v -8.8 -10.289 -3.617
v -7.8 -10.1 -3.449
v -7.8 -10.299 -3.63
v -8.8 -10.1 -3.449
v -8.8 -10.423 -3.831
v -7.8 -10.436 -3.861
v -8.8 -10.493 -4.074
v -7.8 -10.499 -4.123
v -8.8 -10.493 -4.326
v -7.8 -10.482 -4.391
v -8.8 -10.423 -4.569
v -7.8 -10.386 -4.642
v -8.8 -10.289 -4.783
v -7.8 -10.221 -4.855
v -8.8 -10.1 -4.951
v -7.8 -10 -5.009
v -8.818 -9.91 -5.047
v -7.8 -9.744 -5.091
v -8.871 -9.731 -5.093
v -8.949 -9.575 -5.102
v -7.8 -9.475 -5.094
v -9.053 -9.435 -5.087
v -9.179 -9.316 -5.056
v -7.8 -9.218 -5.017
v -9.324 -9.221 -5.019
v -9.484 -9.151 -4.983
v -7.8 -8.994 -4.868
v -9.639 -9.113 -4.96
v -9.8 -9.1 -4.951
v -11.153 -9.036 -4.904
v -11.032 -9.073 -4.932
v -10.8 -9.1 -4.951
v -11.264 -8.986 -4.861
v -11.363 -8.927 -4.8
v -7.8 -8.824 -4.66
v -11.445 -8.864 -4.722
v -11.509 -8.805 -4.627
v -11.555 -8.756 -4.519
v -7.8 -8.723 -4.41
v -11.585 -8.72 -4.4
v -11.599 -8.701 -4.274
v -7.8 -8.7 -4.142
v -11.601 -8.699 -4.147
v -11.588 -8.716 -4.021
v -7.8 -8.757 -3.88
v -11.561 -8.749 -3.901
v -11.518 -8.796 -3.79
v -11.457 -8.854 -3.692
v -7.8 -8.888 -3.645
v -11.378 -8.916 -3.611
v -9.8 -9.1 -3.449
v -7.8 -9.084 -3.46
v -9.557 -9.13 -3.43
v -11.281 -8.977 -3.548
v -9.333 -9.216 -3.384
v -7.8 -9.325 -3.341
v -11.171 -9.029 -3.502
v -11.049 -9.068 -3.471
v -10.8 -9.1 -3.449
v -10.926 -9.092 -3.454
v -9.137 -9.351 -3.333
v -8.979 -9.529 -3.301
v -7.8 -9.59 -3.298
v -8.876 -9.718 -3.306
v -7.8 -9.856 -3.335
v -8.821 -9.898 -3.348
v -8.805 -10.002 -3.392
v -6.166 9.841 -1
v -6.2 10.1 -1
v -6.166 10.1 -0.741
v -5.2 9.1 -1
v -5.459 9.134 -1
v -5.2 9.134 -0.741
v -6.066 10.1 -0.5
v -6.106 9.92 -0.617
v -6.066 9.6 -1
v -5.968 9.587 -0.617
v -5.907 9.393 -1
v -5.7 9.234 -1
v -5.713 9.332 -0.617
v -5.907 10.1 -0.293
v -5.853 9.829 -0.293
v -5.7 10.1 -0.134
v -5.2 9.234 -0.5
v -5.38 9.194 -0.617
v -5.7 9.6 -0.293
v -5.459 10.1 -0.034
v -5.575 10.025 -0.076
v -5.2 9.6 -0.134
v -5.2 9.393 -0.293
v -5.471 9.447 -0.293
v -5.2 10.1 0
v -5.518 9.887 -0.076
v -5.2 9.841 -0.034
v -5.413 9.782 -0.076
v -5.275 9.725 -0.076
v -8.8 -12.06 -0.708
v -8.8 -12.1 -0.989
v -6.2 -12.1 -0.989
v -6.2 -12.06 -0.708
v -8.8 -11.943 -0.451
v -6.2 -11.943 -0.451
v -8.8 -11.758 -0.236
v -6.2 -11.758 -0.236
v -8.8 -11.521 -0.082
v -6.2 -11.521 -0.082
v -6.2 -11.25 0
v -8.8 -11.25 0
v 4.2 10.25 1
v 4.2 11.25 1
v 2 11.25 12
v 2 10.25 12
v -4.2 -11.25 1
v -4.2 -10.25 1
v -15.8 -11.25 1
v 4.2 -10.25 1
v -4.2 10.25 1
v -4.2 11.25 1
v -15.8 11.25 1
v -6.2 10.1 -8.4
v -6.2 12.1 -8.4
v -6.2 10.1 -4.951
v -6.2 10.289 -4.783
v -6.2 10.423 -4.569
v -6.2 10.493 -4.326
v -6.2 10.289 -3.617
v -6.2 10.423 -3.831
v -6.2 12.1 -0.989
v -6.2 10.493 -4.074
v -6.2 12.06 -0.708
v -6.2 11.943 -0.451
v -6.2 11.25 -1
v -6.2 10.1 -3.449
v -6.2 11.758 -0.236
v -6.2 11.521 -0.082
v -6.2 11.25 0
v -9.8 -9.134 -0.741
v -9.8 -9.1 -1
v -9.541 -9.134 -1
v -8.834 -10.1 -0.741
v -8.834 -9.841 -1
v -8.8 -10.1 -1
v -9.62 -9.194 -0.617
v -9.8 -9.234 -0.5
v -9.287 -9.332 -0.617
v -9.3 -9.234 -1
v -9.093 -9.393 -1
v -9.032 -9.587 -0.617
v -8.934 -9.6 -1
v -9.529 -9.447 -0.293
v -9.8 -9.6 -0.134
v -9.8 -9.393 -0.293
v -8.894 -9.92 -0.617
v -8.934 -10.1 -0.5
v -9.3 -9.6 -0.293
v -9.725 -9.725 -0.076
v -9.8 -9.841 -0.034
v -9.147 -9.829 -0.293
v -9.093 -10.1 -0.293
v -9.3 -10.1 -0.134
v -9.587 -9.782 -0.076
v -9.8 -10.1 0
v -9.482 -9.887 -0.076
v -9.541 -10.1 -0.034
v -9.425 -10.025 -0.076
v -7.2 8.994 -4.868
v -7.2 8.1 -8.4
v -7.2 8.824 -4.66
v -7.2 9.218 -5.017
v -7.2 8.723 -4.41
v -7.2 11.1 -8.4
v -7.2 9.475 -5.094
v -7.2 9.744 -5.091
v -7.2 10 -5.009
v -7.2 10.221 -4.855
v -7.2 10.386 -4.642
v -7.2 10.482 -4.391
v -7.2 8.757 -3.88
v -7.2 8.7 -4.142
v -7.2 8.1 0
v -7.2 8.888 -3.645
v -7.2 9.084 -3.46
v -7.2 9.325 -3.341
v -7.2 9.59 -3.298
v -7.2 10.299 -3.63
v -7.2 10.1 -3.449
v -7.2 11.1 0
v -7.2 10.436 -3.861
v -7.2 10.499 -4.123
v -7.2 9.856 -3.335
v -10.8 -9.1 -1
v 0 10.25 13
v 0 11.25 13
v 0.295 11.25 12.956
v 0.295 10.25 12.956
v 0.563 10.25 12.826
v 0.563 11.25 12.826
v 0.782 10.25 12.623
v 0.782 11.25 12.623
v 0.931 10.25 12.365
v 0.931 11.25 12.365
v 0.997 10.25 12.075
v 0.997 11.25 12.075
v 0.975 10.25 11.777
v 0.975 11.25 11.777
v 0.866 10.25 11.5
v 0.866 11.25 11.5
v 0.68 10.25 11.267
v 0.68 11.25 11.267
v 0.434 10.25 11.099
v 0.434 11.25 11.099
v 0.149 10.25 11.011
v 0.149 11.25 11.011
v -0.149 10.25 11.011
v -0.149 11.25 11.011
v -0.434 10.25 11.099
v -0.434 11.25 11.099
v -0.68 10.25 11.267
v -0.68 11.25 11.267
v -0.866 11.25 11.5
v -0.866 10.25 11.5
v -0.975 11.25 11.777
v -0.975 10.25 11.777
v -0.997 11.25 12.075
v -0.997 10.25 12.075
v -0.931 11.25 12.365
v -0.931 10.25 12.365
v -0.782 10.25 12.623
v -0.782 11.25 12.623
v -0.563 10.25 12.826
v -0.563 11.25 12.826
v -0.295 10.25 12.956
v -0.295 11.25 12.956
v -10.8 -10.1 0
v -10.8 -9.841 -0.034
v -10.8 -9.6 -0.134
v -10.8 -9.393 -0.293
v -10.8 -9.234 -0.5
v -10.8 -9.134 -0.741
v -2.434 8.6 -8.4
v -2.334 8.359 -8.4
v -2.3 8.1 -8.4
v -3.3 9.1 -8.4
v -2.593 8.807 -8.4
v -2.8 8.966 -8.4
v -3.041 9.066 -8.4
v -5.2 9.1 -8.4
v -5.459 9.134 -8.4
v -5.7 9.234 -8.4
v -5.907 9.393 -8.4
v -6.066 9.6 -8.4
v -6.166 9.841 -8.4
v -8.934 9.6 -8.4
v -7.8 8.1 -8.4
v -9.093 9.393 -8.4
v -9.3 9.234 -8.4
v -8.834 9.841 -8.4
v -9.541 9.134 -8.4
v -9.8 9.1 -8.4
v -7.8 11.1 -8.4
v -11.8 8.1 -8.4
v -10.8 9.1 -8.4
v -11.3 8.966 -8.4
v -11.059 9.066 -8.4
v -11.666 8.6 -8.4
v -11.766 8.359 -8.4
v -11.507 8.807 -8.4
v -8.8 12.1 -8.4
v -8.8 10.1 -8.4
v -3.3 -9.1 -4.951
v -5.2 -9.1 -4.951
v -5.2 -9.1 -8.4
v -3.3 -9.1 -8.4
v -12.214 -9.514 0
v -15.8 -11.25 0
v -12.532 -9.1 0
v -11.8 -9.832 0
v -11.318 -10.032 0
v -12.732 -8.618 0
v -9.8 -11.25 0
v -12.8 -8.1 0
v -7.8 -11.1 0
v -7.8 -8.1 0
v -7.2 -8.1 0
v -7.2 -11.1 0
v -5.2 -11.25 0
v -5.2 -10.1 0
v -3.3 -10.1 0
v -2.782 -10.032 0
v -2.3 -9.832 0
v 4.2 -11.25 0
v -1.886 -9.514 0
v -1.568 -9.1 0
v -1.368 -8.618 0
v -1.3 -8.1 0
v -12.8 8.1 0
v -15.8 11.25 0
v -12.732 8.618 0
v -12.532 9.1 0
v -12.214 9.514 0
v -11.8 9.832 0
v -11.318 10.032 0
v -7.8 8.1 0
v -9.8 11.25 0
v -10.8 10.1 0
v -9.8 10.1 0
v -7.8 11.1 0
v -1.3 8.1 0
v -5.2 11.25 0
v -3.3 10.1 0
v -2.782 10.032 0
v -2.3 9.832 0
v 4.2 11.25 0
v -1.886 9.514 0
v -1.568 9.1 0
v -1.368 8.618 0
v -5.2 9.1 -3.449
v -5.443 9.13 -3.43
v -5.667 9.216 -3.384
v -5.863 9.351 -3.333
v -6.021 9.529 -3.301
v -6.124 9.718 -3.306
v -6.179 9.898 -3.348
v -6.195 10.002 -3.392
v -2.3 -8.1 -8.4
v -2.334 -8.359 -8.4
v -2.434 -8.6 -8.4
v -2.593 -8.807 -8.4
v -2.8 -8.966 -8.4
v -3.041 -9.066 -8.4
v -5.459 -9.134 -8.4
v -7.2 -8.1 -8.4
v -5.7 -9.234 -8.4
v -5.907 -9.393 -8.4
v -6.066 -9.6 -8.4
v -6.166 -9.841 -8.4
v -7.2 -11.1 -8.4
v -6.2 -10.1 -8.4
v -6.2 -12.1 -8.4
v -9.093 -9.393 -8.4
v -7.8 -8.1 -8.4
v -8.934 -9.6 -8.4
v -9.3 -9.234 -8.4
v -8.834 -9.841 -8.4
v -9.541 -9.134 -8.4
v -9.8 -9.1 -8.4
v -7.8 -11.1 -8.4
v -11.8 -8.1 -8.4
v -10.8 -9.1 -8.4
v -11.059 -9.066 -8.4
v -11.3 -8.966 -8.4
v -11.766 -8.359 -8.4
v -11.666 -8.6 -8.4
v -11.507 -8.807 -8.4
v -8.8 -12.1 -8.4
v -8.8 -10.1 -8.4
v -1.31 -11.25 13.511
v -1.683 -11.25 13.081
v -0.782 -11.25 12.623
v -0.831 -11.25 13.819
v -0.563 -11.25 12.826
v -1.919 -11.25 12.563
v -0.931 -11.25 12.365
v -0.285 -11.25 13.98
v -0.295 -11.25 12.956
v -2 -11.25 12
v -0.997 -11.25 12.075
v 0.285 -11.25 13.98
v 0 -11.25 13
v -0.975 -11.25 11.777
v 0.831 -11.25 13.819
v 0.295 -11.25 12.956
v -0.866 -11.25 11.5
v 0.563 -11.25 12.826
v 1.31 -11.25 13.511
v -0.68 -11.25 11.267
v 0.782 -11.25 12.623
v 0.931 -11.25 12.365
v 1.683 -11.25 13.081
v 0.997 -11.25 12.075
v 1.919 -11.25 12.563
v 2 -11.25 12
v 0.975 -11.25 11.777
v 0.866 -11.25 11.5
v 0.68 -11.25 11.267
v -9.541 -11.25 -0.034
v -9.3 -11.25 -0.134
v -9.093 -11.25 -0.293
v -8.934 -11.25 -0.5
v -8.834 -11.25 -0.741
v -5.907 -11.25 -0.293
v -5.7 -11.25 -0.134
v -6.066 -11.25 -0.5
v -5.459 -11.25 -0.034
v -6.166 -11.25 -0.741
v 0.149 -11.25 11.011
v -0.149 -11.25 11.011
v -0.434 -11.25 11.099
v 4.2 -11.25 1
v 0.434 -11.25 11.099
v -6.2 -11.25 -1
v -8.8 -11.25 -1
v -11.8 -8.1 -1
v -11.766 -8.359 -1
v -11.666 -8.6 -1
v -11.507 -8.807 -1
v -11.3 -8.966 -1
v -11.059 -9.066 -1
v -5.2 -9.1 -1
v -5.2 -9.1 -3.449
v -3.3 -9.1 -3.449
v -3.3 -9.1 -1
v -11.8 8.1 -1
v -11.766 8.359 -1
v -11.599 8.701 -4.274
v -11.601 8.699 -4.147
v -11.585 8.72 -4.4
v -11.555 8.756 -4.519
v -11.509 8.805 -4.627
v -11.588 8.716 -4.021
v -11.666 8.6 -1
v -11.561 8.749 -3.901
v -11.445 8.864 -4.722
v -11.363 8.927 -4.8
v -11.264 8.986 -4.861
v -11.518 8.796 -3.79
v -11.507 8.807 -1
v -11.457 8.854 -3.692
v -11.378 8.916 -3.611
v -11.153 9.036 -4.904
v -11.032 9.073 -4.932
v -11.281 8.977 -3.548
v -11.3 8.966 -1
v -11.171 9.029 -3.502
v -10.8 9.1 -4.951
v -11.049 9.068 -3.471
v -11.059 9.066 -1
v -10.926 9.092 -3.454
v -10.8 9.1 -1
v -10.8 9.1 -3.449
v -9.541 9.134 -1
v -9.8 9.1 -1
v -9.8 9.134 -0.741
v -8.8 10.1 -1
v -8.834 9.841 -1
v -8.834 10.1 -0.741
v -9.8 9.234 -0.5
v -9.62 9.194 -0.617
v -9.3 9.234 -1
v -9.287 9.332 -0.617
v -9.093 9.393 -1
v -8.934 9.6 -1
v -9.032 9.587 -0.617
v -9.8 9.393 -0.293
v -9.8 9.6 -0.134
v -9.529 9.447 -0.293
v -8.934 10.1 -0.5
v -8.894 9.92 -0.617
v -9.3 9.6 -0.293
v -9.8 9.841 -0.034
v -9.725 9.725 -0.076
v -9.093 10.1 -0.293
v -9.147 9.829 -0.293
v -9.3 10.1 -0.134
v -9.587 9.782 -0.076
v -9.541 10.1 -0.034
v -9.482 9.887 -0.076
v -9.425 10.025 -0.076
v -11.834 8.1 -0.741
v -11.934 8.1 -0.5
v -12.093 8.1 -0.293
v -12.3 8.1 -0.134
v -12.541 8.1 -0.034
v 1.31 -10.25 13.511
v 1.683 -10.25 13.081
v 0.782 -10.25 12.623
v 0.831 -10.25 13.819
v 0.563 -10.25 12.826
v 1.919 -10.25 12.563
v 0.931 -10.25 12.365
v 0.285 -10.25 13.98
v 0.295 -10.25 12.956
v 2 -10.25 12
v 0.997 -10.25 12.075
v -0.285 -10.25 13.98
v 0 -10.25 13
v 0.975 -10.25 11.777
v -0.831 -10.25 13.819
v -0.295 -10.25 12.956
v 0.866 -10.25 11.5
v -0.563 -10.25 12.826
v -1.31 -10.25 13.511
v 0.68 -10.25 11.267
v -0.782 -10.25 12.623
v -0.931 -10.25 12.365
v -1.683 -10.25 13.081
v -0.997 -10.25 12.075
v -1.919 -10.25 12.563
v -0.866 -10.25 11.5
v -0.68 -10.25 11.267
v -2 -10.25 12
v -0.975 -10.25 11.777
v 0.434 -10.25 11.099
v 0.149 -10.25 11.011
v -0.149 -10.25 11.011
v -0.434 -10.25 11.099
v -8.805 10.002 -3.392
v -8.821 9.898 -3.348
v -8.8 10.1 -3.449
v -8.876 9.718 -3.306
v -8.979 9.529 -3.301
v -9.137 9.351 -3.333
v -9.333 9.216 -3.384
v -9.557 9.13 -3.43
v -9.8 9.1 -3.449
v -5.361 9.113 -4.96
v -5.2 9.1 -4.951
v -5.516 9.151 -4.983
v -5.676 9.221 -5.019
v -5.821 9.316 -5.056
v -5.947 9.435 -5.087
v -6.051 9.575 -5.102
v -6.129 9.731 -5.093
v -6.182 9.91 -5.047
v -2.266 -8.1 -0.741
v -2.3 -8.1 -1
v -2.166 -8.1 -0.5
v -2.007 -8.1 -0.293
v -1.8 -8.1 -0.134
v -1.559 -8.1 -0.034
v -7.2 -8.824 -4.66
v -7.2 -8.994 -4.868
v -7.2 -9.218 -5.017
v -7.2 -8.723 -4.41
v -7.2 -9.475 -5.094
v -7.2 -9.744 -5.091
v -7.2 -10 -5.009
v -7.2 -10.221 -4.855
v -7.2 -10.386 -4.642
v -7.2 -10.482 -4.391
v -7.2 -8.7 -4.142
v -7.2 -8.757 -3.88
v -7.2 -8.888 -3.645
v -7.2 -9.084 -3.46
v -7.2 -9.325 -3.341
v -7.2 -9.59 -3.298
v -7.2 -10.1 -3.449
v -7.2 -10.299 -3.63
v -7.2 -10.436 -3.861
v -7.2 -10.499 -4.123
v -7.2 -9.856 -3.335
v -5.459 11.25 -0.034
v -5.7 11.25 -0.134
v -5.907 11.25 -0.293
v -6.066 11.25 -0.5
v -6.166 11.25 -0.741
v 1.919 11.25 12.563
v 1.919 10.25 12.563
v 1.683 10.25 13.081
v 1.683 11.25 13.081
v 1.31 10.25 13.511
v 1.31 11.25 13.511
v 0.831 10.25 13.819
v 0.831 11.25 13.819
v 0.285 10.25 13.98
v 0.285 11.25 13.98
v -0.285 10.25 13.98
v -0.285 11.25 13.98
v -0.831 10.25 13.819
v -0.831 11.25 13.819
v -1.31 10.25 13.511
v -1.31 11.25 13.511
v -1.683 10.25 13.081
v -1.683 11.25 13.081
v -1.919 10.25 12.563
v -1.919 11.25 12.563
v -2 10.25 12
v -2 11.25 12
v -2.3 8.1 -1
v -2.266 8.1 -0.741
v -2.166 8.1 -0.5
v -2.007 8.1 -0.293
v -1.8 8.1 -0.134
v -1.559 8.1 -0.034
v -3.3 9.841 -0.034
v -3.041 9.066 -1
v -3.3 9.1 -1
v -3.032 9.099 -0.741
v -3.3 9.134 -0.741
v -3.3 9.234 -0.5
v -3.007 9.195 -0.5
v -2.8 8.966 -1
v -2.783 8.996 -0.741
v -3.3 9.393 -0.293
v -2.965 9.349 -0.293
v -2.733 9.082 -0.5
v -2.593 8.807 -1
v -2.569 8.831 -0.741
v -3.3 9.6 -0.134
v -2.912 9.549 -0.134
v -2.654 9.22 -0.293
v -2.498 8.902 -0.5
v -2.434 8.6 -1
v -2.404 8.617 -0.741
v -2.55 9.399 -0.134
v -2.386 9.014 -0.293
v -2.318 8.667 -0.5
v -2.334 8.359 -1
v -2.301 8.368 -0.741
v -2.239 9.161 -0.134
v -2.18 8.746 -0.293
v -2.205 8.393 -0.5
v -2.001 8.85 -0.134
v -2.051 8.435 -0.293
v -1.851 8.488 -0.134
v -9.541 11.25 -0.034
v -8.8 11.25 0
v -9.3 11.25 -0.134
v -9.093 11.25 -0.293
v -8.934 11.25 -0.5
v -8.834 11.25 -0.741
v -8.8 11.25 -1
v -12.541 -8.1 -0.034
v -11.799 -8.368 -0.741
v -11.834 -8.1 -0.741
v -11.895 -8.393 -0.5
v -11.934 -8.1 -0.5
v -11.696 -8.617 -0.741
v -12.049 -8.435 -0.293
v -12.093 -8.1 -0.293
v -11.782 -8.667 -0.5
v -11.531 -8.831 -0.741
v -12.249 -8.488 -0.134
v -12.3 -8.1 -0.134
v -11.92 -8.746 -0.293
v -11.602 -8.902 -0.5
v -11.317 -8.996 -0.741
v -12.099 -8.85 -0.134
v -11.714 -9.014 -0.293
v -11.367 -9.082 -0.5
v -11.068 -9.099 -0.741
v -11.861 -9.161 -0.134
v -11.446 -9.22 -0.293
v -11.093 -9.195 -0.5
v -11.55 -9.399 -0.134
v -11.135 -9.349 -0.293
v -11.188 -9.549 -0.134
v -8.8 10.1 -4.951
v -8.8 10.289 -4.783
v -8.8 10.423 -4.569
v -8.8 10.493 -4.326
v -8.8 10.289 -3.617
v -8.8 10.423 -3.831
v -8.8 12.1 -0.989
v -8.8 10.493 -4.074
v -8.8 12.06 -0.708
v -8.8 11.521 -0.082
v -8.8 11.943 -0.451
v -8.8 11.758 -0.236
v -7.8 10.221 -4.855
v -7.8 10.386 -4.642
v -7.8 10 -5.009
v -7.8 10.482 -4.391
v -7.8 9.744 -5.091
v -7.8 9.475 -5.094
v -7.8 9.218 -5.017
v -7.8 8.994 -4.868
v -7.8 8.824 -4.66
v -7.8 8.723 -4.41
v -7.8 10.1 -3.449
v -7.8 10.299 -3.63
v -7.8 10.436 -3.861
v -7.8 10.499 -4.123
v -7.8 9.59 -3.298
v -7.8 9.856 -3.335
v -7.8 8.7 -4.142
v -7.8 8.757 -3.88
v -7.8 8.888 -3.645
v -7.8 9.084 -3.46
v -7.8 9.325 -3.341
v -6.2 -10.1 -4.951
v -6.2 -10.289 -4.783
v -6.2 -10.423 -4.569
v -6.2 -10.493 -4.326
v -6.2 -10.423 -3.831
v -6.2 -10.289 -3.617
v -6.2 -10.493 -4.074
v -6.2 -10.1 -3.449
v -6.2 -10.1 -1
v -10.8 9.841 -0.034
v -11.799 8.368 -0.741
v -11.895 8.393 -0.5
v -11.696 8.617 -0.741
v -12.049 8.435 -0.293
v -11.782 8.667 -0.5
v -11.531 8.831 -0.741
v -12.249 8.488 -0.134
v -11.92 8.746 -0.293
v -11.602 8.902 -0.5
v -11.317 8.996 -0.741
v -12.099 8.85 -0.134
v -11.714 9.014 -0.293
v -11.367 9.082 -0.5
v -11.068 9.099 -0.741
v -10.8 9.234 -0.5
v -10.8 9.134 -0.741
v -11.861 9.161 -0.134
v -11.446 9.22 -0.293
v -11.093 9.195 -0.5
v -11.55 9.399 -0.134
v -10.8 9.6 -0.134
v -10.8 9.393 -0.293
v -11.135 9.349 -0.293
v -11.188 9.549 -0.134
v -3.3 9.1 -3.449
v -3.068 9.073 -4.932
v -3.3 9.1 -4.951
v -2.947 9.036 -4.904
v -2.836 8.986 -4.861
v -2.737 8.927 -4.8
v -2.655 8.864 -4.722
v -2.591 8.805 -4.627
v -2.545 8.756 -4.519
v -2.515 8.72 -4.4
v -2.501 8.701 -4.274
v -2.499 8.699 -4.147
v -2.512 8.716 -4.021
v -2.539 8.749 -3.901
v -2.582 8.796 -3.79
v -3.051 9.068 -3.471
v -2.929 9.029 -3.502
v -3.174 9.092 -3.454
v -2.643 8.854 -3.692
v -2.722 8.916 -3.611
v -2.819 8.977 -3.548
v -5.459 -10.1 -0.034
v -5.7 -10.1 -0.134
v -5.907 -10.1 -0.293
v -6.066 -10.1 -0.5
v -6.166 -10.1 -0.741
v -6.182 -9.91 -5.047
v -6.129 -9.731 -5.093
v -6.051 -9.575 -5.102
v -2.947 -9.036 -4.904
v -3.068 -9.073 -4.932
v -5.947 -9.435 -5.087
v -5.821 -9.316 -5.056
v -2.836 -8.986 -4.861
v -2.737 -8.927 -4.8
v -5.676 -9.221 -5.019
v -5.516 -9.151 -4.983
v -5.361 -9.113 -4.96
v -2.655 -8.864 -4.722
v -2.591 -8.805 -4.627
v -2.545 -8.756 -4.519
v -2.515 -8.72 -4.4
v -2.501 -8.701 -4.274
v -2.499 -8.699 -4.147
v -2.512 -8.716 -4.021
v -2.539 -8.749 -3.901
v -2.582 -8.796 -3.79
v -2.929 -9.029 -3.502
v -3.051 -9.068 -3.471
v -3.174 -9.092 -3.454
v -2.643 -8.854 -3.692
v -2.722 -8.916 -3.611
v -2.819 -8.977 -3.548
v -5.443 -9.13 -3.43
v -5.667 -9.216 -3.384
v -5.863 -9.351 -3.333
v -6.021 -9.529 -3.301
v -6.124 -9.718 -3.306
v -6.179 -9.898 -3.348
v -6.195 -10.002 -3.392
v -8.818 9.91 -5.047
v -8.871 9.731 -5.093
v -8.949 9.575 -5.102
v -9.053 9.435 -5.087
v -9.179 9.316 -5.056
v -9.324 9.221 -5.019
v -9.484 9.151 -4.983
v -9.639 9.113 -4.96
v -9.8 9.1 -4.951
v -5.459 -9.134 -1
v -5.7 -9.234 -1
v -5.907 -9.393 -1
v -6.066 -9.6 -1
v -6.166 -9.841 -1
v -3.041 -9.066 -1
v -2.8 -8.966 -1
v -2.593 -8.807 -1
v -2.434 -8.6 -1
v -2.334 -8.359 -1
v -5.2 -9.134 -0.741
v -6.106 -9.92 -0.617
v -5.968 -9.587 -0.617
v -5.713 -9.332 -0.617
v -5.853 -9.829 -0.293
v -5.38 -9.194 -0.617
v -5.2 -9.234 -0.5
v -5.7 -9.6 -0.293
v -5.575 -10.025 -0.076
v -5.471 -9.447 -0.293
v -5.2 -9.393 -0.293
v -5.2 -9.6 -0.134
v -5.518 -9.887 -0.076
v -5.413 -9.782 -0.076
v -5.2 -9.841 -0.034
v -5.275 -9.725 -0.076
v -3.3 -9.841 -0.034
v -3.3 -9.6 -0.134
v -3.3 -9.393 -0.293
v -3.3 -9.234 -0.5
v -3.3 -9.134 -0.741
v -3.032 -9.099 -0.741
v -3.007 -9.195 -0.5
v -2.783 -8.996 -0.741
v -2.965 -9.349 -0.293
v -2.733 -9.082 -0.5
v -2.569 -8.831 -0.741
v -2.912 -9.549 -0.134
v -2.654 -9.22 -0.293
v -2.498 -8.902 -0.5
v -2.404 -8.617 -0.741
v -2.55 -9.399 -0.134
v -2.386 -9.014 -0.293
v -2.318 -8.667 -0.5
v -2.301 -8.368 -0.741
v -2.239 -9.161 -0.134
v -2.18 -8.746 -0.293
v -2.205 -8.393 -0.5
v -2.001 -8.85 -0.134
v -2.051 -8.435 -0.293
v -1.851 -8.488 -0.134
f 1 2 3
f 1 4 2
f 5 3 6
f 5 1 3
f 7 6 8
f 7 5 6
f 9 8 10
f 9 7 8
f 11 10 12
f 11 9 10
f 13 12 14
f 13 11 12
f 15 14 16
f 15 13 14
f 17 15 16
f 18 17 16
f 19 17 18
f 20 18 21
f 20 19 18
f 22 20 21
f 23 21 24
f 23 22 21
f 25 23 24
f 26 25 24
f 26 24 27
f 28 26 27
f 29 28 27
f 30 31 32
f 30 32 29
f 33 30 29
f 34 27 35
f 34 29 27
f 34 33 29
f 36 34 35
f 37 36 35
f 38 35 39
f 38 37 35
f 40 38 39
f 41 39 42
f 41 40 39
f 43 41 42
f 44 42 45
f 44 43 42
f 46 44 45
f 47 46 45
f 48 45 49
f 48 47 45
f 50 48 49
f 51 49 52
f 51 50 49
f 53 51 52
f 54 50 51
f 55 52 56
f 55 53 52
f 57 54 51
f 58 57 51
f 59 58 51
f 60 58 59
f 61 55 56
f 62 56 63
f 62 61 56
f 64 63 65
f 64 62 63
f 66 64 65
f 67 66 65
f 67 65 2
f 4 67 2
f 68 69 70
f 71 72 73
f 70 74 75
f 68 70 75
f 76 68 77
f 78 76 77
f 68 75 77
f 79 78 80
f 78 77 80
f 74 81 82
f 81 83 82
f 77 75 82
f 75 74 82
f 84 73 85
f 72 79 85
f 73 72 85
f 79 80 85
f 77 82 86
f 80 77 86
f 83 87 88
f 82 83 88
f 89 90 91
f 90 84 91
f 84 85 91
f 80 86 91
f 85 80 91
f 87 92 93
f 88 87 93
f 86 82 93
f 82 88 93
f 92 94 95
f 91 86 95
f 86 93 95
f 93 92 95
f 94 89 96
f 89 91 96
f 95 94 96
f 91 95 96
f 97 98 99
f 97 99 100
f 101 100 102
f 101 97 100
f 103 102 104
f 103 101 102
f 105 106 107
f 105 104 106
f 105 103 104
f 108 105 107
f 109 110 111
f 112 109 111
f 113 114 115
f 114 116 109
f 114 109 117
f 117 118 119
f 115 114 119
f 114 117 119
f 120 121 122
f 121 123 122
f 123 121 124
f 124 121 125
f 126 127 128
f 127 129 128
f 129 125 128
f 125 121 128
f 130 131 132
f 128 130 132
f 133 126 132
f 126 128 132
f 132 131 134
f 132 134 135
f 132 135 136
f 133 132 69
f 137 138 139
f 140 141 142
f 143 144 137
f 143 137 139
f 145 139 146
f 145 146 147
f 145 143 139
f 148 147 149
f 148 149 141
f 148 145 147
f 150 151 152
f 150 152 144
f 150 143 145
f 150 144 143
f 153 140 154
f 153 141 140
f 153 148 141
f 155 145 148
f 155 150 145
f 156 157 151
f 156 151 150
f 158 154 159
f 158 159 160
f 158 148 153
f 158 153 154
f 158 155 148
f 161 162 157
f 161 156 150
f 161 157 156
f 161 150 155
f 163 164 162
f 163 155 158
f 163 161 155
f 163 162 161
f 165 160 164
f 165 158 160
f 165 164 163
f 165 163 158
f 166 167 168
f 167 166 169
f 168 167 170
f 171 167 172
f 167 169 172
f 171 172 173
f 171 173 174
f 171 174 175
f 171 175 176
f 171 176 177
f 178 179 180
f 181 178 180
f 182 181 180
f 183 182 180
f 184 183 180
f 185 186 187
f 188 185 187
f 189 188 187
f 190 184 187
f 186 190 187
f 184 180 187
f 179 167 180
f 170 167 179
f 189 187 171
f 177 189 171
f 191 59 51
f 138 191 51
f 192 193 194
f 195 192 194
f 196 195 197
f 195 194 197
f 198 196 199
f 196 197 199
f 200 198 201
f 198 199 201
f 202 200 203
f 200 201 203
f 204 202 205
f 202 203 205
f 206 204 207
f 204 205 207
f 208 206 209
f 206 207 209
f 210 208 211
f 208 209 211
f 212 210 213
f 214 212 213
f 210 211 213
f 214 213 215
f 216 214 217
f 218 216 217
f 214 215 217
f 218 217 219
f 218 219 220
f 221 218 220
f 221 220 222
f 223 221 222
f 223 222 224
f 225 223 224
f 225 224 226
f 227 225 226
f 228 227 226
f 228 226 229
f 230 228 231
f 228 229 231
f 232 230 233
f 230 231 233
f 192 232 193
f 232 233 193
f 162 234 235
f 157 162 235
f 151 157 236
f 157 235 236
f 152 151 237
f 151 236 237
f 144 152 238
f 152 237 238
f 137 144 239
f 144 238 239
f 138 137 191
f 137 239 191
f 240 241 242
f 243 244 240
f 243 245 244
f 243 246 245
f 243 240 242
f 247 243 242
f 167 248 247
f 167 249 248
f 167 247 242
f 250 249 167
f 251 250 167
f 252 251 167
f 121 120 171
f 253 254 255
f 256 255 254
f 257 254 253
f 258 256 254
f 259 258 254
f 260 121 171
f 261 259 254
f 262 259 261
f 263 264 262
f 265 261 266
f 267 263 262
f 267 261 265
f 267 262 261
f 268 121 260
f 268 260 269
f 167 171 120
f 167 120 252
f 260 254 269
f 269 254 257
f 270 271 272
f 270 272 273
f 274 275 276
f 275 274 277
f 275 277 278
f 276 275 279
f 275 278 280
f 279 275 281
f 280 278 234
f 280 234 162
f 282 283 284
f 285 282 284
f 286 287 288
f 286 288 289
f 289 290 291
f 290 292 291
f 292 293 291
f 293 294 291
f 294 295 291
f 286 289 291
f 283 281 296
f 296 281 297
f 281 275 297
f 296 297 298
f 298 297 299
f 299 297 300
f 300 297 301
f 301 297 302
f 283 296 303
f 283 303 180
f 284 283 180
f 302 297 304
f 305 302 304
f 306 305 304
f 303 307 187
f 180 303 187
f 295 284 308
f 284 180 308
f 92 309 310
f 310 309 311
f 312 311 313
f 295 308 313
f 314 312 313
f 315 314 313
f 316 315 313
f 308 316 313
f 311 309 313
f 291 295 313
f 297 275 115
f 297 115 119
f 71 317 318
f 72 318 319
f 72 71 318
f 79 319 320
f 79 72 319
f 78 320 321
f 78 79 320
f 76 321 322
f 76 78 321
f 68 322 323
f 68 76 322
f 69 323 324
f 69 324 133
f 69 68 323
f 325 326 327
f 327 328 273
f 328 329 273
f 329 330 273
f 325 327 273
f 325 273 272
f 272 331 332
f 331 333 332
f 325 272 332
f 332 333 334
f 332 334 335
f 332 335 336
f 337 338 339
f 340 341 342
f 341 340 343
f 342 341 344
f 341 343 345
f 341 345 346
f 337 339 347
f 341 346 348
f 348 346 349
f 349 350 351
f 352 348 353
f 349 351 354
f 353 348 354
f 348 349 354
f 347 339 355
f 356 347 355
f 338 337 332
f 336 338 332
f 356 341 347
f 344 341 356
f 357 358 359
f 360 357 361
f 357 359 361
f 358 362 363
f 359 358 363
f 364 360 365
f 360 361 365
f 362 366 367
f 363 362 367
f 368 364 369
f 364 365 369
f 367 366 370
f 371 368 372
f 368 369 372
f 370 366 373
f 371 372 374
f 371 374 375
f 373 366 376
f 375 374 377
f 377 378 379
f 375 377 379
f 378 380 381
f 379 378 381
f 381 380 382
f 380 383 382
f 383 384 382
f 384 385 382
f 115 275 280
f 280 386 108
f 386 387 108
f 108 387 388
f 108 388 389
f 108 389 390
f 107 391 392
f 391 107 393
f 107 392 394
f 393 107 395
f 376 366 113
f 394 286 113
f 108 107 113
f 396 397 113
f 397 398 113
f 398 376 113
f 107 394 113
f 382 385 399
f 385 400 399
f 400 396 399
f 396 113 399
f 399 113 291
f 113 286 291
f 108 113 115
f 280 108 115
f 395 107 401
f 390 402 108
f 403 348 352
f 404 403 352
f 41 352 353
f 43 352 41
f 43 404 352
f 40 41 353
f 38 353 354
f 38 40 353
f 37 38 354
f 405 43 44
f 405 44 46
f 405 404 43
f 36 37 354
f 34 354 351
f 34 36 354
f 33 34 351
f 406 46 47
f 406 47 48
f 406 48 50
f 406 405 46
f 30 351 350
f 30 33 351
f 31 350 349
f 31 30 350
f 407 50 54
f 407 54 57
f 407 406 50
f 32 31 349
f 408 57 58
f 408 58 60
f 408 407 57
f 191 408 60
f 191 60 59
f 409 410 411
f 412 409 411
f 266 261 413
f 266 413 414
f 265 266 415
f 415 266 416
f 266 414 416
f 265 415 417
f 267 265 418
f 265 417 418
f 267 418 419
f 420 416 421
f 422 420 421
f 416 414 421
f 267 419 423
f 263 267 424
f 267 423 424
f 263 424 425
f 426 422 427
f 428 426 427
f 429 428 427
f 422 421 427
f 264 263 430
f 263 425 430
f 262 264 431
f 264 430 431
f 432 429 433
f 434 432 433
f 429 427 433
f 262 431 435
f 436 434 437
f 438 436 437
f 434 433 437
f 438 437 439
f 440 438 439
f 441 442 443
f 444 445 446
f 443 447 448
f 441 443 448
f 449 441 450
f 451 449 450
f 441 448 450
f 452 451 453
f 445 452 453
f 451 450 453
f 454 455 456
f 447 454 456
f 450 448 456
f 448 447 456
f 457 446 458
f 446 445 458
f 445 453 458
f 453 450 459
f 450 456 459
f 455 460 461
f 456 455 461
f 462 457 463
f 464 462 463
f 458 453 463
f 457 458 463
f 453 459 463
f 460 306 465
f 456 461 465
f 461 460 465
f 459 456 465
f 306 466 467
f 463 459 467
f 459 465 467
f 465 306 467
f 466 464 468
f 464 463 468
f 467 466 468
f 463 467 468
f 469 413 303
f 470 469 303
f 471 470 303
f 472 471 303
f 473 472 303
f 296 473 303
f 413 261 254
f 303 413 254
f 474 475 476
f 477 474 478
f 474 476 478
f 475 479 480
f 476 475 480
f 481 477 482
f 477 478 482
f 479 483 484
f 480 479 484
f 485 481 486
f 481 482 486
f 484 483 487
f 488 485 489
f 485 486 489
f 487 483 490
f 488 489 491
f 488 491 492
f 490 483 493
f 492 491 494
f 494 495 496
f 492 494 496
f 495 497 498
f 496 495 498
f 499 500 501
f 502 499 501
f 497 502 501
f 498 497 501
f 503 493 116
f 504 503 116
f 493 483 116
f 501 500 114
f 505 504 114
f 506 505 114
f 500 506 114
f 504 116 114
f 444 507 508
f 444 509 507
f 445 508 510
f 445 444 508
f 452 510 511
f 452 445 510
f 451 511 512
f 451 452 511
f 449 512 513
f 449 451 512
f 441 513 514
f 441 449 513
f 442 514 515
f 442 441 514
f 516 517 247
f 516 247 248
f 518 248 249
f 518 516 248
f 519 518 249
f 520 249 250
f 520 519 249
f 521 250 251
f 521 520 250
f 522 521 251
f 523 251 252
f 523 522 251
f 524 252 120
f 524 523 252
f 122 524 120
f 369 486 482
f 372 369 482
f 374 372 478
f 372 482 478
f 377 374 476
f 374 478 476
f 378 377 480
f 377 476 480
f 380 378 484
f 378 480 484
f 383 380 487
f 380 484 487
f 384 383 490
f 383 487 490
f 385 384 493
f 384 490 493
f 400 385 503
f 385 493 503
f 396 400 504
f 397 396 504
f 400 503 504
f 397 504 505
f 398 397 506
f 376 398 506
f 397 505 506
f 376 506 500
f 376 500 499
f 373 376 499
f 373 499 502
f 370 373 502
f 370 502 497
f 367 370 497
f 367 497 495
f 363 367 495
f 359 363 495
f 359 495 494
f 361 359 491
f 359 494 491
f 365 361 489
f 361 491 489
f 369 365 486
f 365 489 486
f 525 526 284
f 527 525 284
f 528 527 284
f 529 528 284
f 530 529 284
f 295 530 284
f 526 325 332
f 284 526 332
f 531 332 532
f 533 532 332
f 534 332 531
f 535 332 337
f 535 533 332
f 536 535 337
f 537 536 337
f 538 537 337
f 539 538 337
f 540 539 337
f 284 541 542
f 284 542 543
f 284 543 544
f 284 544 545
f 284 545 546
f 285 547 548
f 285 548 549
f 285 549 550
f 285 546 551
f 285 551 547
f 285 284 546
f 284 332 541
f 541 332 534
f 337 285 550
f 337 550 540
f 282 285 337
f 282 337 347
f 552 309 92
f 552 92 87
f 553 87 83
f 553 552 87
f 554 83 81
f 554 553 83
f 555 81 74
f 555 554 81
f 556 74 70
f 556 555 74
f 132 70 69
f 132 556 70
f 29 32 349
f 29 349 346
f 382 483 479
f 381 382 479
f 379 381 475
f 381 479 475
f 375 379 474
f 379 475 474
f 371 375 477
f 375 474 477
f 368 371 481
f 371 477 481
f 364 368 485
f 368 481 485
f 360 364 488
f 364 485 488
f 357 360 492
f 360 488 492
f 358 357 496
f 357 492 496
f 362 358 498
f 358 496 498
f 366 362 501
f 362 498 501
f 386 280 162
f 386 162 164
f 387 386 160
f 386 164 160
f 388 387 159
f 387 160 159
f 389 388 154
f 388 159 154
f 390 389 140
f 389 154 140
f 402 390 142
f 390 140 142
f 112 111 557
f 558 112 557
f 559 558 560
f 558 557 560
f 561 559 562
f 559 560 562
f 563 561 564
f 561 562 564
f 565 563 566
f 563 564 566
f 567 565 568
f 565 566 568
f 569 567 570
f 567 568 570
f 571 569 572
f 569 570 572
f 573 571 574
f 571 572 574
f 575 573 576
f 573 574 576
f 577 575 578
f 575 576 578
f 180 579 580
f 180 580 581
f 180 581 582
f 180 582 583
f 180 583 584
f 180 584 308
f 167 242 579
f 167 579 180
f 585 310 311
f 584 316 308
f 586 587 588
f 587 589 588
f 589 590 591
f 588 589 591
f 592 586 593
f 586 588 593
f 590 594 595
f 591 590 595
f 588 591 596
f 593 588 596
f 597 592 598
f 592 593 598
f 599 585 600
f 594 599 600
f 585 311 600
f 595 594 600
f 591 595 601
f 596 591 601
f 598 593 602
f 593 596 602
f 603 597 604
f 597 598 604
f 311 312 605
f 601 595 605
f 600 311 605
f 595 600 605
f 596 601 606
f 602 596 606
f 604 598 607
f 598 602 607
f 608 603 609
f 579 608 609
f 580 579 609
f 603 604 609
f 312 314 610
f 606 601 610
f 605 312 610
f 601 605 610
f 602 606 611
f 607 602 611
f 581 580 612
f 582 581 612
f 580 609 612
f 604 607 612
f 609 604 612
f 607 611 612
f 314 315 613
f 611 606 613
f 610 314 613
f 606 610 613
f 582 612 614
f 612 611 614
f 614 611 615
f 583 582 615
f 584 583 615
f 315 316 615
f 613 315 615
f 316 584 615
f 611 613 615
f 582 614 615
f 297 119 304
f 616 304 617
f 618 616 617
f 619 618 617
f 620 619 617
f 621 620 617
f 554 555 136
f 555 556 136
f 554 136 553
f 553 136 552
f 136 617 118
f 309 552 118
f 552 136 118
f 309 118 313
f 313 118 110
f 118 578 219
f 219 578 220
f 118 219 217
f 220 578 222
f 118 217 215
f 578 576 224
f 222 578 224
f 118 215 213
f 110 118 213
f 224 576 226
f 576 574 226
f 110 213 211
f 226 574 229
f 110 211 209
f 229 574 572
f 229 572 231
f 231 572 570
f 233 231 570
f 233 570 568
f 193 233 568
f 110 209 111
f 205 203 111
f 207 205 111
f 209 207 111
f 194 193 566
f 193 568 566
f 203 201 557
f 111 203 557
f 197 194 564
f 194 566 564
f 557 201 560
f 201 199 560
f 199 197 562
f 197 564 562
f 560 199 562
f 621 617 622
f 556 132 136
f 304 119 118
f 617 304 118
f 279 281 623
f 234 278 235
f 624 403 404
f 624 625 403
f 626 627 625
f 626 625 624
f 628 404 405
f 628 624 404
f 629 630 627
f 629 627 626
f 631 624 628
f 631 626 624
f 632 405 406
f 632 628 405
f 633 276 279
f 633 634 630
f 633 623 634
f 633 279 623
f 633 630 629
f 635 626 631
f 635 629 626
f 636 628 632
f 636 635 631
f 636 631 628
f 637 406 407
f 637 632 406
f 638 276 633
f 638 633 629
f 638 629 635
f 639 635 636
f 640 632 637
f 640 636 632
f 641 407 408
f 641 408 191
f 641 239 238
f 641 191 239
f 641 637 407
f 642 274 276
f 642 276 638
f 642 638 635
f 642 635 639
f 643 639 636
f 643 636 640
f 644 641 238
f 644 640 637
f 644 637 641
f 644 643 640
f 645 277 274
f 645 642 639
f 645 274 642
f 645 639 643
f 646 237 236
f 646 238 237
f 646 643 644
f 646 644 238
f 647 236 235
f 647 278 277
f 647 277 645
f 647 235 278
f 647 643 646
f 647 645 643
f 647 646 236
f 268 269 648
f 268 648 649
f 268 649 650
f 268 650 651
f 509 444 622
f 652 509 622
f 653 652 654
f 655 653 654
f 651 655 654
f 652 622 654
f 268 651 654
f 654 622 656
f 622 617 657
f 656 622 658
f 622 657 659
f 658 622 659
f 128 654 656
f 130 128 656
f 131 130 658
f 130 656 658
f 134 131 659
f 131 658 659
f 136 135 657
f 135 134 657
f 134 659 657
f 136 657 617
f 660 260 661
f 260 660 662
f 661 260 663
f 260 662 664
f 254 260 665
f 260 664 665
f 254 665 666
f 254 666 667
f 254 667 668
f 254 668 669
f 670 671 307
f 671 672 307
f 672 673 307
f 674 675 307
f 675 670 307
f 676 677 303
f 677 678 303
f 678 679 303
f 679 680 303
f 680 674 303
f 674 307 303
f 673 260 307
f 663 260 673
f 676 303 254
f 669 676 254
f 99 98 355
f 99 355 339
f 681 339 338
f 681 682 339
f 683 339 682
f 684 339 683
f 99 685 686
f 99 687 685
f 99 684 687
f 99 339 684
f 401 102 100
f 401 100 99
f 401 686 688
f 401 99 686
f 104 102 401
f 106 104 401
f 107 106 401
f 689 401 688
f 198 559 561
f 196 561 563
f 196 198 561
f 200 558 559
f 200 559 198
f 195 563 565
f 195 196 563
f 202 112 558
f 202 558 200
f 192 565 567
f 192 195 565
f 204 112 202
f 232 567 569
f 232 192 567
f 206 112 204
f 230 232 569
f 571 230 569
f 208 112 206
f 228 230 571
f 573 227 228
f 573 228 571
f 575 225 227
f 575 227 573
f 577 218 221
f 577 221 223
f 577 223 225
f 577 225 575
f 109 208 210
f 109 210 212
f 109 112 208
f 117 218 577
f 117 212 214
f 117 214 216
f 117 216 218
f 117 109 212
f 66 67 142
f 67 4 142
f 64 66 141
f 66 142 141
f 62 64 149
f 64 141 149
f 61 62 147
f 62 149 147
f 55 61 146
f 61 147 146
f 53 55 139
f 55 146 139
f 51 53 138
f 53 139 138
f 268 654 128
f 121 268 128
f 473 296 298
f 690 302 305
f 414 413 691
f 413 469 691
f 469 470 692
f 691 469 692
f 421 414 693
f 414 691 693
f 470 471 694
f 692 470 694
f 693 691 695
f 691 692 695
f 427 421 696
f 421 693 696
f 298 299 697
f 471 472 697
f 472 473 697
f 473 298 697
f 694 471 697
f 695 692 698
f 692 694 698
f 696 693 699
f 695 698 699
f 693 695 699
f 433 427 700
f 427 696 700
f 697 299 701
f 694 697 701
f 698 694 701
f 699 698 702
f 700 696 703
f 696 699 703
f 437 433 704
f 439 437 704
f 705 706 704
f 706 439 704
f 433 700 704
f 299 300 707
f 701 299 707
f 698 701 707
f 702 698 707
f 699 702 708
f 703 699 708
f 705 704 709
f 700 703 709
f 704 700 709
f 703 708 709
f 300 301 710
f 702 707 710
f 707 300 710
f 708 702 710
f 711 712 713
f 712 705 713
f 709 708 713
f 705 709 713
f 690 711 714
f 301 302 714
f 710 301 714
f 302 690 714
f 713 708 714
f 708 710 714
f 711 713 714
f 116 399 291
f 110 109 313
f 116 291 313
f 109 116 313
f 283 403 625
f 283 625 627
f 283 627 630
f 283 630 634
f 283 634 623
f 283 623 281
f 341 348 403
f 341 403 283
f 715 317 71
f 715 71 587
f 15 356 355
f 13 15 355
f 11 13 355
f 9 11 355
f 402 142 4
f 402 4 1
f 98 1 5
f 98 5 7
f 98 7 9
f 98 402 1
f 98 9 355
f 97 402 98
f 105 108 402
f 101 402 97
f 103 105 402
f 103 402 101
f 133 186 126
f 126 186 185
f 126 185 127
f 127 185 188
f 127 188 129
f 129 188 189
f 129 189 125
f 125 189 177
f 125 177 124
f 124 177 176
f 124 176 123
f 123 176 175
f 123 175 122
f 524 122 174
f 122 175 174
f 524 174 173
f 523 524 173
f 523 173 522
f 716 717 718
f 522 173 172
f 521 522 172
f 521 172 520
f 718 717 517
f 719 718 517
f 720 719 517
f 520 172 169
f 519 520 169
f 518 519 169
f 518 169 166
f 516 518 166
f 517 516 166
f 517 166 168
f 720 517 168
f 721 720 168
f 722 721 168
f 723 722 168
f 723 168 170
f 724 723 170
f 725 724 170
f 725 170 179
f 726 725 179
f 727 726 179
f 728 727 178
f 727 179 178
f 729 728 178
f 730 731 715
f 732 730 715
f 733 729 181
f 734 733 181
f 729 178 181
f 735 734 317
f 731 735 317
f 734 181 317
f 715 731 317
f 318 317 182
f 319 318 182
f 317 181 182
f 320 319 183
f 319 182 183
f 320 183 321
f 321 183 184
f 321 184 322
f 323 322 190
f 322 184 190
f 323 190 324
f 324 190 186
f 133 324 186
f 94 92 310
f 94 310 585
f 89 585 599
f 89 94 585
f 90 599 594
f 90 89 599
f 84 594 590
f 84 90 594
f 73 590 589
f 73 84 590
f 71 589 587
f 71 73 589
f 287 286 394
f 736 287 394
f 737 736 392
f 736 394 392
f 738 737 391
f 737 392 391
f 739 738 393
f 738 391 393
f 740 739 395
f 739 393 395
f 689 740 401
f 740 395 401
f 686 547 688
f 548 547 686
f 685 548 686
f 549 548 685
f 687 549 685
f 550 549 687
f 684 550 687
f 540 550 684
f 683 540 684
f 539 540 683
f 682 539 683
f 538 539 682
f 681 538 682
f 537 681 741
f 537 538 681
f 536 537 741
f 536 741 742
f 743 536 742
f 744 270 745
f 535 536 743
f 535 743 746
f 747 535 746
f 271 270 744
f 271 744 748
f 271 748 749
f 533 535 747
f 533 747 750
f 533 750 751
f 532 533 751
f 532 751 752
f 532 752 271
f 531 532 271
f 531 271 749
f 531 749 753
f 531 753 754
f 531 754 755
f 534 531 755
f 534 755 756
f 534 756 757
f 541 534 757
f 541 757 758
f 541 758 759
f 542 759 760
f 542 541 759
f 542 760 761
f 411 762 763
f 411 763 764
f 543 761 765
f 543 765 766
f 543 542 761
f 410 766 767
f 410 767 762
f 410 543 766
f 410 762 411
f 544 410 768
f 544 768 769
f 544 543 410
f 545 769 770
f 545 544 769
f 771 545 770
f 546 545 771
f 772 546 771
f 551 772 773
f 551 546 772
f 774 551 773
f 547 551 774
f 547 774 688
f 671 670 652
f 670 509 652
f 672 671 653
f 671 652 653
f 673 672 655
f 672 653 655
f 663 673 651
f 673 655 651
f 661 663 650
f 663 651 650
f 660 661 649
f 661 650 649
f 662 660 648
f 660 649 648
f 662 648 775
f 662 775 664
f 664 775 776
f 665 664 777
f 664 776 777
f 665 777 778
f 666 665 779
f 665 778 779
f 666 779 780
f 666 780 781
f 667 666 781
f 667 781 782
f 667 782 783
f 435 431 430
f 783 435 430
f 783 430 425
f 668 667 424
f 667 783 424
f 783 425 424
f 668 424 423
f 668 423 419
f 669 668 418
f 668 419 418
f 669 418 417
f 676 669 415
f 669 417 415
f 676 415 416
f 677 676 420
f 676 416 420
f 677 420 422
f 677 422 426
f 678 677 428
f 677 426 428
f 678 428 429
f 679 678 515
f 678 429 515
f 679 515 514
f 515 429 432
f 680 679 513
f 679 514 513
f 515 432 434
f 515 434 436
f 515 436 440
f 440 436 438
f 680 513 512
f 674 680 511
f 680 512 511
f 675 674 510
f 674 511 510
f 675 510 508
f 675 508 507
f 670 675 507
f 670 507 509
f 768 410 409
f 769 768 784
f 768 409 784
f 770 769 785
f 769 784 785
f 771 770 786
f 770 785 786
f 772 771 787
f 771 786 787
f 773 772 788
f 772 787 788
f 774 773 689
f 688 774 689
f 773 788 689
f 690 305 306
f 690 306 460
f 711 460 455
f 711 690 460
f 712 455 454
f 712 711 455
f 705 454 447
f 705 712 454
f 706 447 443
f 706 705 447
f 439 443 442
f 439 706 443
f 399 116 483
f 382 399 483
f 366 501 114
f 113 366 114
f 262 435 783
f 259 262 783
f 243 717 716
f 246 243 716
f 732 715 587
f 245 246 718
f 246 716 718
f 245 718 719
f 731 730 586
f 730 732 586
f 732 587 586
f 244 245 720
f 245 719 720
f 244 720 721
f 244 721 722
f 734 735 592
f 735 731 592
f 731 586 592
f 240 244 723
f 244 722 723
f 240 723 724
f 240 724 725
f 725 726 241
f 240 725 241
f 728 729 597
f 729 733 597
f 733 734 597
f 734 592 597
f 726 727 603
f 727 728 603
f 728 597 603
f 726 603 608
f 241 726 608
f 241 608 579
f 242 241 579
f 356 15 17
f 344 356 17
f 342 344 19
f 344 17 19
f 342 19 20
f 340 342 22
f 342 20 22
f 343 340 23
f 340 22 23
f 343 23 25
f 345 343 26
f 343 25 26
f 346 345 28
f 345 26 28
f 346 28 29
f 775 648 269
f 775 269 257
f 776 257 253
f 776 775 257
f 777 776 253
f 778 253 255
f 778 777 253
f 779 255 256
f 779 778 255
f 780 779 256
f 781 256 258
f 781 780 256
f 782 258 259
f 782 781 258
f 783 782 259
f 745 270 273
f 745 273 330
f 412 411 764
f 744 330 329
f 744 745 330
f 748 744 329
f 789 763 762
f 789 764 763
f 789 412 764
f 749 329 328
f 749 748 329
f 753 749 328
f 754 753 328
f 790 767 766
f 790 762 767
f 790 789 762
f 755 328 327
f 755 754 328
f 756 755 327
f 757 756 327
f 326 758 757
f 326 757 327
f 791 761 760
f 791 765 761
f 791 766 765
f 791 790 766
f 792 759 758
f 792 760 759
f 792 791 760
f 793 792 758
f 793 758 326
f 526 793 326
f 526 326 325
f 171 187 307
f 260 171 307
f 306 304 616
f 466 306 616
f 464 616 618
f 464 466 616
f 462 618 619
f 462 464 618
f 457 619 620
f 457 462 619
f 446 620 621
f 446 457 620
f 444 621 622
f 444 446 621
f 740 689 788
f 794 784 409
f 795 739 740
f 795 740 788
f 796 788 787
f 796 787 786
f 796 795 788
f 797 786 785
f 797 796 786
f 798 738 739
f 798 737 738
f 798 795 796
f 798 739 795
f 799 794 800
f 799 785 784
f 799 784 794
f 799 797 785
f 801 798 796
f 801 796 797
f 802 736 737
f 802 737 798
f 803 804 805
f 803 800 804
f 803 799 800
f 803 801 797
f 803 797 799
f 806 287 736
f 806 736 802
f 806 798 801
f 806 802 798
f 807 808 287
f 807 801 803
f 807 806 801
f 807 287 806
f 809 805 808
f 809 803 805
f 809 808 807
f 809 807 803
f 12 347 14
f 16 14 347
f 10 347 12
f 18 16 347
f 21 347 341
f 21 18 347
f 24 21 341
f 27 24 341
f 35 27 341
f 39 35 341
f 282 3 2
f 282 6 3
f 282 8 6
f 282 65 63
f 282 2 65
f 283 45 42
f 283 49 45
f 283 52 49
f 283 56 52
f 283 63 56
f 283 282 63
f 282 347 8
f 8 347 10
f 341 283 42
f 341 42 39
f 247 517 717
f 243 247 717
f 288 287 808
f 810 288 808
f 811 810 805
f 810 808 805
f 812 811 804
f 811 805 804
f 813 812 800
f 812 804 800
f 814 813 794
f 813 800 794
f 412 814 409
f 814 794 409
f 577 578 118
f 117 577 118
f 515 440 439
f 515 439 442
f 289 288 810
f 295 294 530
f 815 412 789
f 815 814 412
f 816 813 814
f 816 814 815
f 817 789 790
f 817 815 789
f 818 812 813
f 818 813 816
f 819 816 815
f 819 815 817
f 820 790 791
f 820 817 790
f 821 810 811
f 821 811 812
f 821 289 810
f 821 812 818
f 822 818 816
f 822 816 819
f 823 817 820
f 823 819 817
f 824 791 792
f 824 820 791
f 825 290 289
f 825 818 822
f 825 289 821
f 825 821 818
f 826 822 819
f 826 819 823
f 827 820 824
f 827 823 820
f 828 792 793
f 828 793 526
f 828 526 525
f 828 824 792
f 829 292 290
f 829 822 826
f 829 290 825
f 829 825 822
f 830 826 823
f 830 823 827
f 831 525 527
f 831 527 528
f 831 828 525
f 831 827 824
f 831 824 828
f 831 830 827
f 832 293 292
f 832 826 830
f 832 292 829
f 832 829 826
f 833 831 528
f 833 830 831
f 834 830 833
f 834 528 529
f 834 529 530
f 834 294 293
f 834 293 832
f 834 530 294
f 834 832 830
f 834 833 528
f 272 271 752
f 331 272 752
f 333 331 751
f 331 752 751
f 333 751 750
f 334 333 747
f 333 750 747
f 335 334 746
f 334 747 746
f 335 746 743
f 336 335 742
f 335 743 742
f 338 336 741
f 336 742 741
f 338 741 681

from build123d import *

# Parameters (mm, degrees)
SKETCH1_W           = 8.4
SKETCH1_H           = 22.5
BOSS_EXTRUDE1_DEPTH = 1
SKETCH2_R           = 1
BOSS_EXTRUDE2_DEPTH = 1
BOSS_EXTRUDE3_START = -21.5
SKETCH2_2_R         = 1
BOSS_EXTRUDE3_DEPTH = 1
SKETCH1_3_W         = 11.6
SKETCH1_3_H         = 22.5
BOSS_EXTRUDE4_DEPTH = 1
BOSS_EXTRUDE5_DEPTH = 8.4
FILLET2_R           = 1
SKETCH4_R           = 0.902238409
CUT_EXTRUDE1_DEPTH  = 23.614375959


with BuildPart() as part:
    # Sketch1 → Boss-Extrude1 (new body)
    with BuildSketch(Plane.XY):
        Rectangle(SKETCH1_W, SKETCH1_H)
    extrude(amount=BOSS_EXTRUDE1_DEPTH)

    # Sketch2 → Boss-Extrude2 (add)
    with BuildSketch(Plane(origin=(0, 11.25, 0), x_dir=(1, 0, 0), z_dir=(0, 1, 0))):
        with BuildLine():
            Line((-2, -12), (-4.2, -1))
            Line((-4.2, -1), (4.2, -1))
            Line((4.2, -1), (2, -12))
            ThreePointArc((2, -12), (0, -14), (-2, -12))
        make_face()
        with Locations(Location((0, -12, 0), (0, 0, 270))):
            Circle(SKETCH2_R, mode=Mode.SUBTRACT)
    extrude(amount=-BOSS_EXTRUDE2_DEPTH)

    # Sketch2<2> → Boss-Extrude3 (add)
    with BuildSketch(Plane(origin=(0, 11.25, 0), x_dir=(1, 0, 0), z_dir=(0, 1, 0)).offset(BOSS_EXTRUDE3_START)):
        with BuildLine():
            Line((-2, -12), (-4.2, -1))
            Line((-4.2, -1), (4.2, -1))
            Line((4.2, -1), (2, -12))
            ThreePointArc((2, -12), (0, -14), (-2, -12))
        make_face()
        with Locations(Location((0, -12, 0), (0, 0, 270))):
            Circle(SKETCH2_2_R, mode=Mode.SUBTRACT)
    extrude(amount=-BOSS_EXTRUDE3_DEPTH)

    # Sketch1<3> → Boss-Extrude4 (add)
    with BuildSketch(Plane.XY):
        with Locations((-10, 0)):
            Rectangle(SKETCH1_3_W, SKETCH1_3_H)
    extrude(amount=BOSS_EXTRUDE4_DEPTH)

    # Sketch3 → Boss-Extrude5 (add)
    with BuildSketch(Plane(origin=(0, 0, 0), x_dir=(-1, 0, 0), z_dir=(0, 0, -1))):
        Polygon((2.3, 8.1), (7.2, 8.1), (7.2, 11.1), (7.8, 11.1), (7.8, 8.1), (11.8, 8.1), (11.8, 9.1), (8.8, 9.1), (8.8, 12.1), (6.2, 12.1), (6.2, 9.1), (2.3, 9.1), align=None)
    extrude(amount=BOSS_EXTRUDE5_DEPTH)

    # Fillet2
    # the kernel refuses this fillet: 1 mm, written as the material it adds along each edge
    with BuildSketch(Plane(origin=(-6.2, 11.25, 0), x_dir=(1, 0, 0), z_dir=(0, -1, 0))) as fillet2_piece_1_section:
        with BuildLine():
            CenterArc((FILLET2_R, -FILLET2_R), FILLET2_R, 90, 90)
            Line((0, -FILLET2_R), (0, 0))
            Line((0, 0), (FILLET2_R, 0))
        make_face()
    fillet2_piece_1 = extrude(amount=4.65, mode=Mode.PRIVATE)
    fillet2_piece_1 = split(fillet2_piece_1, bisect_by=Plane(origin=(-6.2, 8.1, 0), z_dir=(0, 1, 0)), keep=Keep.TOP, mode=Mode.PRIVATE)
    add(fillet2_piece_1)
    with BuildSketch(Plane(origin=(-8.8, 9.1, 0), x_dir=(-1, 0, 0), z_dir=(0, 1, 0))) as fillet2_piece_2:
        with BuildLine():
            CenterArc((FILLET2_R, -FILLET2_R), FILLET2_R, 90, 90)
            Line((0, -FILLET2_R), (0, 0))
            Line((0, 0), (FILLET2_R, 0))
        make_face()
    extrude(amount=2.15)
    with BuildSketch(Plane(origin=(-8.8, 9.1, 2.5), x_dir=(-1, 0, 0), z_dir=(0, 0, -1))) as fillet2_piece_3_section:
        with BuildLine():
            CenterArc((FILLET2_R, FILLET2_R), FILLET2_R, 180, 90)
            Line((0, FILLET2_R), (0, 0))
            Line((0, 0), (FILLET2_R, 0))
        make_face()
    fillet2_piece_3 = extrude(amount=10.9, mode=Mode.PRIVATE)
    fillet2_piece_3 = split(fillet2_piece_3, bisect_by=Plane(origin=(-8.8, 9.1, 1), z_dir=(0, 0, -1)), keep=Keep.TOP, mode=Mode.PRIVATE)
    add(fillet2_piece_3)
    with BuildSketch(Plane(origin=(-6.2, 9.1, 2.5), x_dir=(0, 1, 0), z_dir=(0, 0, -1))) as fillet2_piece_4_section:
        with BuildLine():
            CenterArc((FILLET2_R, FILLET2_R), FILLET2_R, 180, 90)
            Line((0, FILLET2_R), (0, 0))
            Line((0, 0), (FILLET2_R, 0))
        make_face()
    fillet2_piece_4 = extrude(amount=10.9, mode=Mode.PRIVATE)
    fillet2_piece_4 = split(fillet2_piece_4, bisect_by=Plane(origin=(-6.2, 9.1, 1), z_dir=(0, 0, -1)), keep=Keep.TOP, mode=Mode.PRIVATE)
    add(fillet2_piece_4)
    # the kernel refuses this fillet: 1 mm, written as the material it takes off along each edge
    with BuildSketch(Plane(origin=(-2.3, 9.1, 0), x_dir=(-1, 0, 0), z_dir=(0, 0, -1)), Plane(origin=(-11.8, 9.1, 0), x_dir=(0, -1, 0), z_dir=(0, 0, -1))) as fillet2_2_piece_1:
        with BuildLine():
            CenterArc((FILLET2_R, -FILLET2_R), FILLET2_R, 90, 90)
            Line((0, -FILLET2_R), (0, 0))
            Line((0, 0), (FILLET2_R, 0))
        make_face()
    extrude(amount=10.9, mode=Mode.SUBTRACT)
    with BuildSketch(Plane(origin=(-11.271714992, 12.1, 0), x_dir=(0, 0, -1), z_dir=(1, 0, 0))) as fillet2_2_piece_2:
        with BuildLine():
            CenterArc((0.988685997, -1), FILLET2_R, 90, 81.373073441)
            Line((0, -0.85), (0, 0))
            Line((0, 0), (0.988685997, 0))
        make_face()
    extrude(amount=7.543429983, mode=Mode.SUBTRACT)
    # the kernel refuses this fillet: 1 mm, written as the material it adds along each edge
    with BuildSketch(Plane(origin=(-5.2, 10.1, -1), x_dir=(0, -1, 0), z_dir=(0, 0, 1))) as fillet2_3_piece_1_section:
        Polygon((0, 0), (FILLET2_R * 1.02, 0), (FILLET2_R * 1.02, -FILLET2_R * 1.02), (0, -FILLET2_R * 1.02), align=None)
    fillet2_3_piece_1 = extrude(amount=FILLET2_R * 1.02, mode=Mode.PRIVATE)
    fillet2_3_piece_1 = fillet2_3_piece_1 - Plane(origin=(-5.2, 10.1, -1), x_dir=(0.7071067811865475, 0.7071067811865475, 0), z_dir=(0, 0, 1)) * Sphere(FILLET2_R, mode=Mode.PRIVATE)
    add(fillet2_3_piece_1)
    with BuildSketch(Plane(origin=(-9.8, 10.1, -1), x_dir=(0, -1, 0), z_dir=(0, 0, 1))) as fillet2_3_piece_2_section:
        Polygon((0, 0), (FILLET2_R * 1.02, 0), (FILLET2_R * 1.02, FILLET2_R * 1.02), (0, FILLET2_R * 1.02), align=None)
    fillet2_3_piece_2 = extrude(amount=FILLET2_R * 1.02, mode=Mode.PRIVATE)
    fillet2_3_piece_2 = fillet2_3_piece_2 - Plane(origin=(-9.8, 10.1, -1), x_dir=(-0.7071067811865475, 0.7071067811865475, 0), z_dir=(0, 0, 1)) * Sphere(FILLET2_R, mode=Mode.PRIVATE)
    add(fillet2_3_piece_2)
    with BuildSketch(Plane(origin=(-10.8, 9.1, 0), x_dir=(0, 1, 0), z_dir=(1, 0, 0))) as fillet2_3_piece_3:
        with BuildLine():
            CenterArc((FILLET2_R, -FILLET2_R), FILLET2_R, 90, 90)
            Line((0, -FILLET2_R), (0, 0))
            Line((0, 0), (FILLET2_R, 0))
        make_face()
    extrude(amount=1)
    with BuildSketch(Plane(origin=(-5.2, 9.1, 0), x_dir=(0, 1, 0), z_dir=(1, 0, 0))) as fillet2_3_piece_4:
        with BuildLine():
            CenterArc((FILLET2_R, -FILLET2_R), FILLET2_R, 90, 90)
            Line((0, -FILLET2_R), (0, 0))
            Line((0, 0), (FILLET2_R, 0))
        make_face()
    extrude(amount=1.9)
    with BuildSketch(Plane(origin=(-3.3, 8.1, 0), x_dir=(0, 1, 0), z_dir=(-1, 0, 0))) as fillet2_3_piece_5:
        with BuildLine():
            CenterArc((1 + FILLET2_R, FILLET2_R), FILLET2_R, 180, 90)
            Line((1, FILLET2_R), (1, 0))
            Line((1, 0), (1 + FILLET2_R, 0))
        make_face()
    revolve(axis=Axis((-3.3, 8.1, 0), (0, 0, -1)), revolution_arc=90)
    with BuildSketch(Plane(origin=(-10.8, 8.1, 0), x_dir=(-1, 0, 0), z_dir=(0, -1, 0))) as fillet2_3_piece_6:
        with BuildLine():
            CenterArc((1 + FILLET2_R, FILLET2_R), FILLET2_R, 180, 90)
            Line((1, FILLET2_R), (1, 0))
            Line((1, 0), (1 + FILLET2_R, 0))
        make_face()
    revolve(axis=Axis((-10.8, 8.1, 0), (0, 0, -1)), revolution_arc=90)

    # Sketch4 → Cut-Extrude1 (cut, symmetric)
    with BuildSketch(Plane.ZY.offset(8.8)):
        with Locations(Location((-4.2, 9.6, 0), (0, 0, 33.654064464))):
            Circle(SKETCH4_R)
    extrude(amount=CUT_EXTRUDE1_DEPTH, both=True, mode=Mode.SUBTRACT)

    # Mirror1: read off the stored shape, not the designer's step
    # Mirror1: part across plane


with BuildPart() as part_1:
    add(part.part)
    add(part.part.mirror(Plane.ZX))


solid = part_1.part
